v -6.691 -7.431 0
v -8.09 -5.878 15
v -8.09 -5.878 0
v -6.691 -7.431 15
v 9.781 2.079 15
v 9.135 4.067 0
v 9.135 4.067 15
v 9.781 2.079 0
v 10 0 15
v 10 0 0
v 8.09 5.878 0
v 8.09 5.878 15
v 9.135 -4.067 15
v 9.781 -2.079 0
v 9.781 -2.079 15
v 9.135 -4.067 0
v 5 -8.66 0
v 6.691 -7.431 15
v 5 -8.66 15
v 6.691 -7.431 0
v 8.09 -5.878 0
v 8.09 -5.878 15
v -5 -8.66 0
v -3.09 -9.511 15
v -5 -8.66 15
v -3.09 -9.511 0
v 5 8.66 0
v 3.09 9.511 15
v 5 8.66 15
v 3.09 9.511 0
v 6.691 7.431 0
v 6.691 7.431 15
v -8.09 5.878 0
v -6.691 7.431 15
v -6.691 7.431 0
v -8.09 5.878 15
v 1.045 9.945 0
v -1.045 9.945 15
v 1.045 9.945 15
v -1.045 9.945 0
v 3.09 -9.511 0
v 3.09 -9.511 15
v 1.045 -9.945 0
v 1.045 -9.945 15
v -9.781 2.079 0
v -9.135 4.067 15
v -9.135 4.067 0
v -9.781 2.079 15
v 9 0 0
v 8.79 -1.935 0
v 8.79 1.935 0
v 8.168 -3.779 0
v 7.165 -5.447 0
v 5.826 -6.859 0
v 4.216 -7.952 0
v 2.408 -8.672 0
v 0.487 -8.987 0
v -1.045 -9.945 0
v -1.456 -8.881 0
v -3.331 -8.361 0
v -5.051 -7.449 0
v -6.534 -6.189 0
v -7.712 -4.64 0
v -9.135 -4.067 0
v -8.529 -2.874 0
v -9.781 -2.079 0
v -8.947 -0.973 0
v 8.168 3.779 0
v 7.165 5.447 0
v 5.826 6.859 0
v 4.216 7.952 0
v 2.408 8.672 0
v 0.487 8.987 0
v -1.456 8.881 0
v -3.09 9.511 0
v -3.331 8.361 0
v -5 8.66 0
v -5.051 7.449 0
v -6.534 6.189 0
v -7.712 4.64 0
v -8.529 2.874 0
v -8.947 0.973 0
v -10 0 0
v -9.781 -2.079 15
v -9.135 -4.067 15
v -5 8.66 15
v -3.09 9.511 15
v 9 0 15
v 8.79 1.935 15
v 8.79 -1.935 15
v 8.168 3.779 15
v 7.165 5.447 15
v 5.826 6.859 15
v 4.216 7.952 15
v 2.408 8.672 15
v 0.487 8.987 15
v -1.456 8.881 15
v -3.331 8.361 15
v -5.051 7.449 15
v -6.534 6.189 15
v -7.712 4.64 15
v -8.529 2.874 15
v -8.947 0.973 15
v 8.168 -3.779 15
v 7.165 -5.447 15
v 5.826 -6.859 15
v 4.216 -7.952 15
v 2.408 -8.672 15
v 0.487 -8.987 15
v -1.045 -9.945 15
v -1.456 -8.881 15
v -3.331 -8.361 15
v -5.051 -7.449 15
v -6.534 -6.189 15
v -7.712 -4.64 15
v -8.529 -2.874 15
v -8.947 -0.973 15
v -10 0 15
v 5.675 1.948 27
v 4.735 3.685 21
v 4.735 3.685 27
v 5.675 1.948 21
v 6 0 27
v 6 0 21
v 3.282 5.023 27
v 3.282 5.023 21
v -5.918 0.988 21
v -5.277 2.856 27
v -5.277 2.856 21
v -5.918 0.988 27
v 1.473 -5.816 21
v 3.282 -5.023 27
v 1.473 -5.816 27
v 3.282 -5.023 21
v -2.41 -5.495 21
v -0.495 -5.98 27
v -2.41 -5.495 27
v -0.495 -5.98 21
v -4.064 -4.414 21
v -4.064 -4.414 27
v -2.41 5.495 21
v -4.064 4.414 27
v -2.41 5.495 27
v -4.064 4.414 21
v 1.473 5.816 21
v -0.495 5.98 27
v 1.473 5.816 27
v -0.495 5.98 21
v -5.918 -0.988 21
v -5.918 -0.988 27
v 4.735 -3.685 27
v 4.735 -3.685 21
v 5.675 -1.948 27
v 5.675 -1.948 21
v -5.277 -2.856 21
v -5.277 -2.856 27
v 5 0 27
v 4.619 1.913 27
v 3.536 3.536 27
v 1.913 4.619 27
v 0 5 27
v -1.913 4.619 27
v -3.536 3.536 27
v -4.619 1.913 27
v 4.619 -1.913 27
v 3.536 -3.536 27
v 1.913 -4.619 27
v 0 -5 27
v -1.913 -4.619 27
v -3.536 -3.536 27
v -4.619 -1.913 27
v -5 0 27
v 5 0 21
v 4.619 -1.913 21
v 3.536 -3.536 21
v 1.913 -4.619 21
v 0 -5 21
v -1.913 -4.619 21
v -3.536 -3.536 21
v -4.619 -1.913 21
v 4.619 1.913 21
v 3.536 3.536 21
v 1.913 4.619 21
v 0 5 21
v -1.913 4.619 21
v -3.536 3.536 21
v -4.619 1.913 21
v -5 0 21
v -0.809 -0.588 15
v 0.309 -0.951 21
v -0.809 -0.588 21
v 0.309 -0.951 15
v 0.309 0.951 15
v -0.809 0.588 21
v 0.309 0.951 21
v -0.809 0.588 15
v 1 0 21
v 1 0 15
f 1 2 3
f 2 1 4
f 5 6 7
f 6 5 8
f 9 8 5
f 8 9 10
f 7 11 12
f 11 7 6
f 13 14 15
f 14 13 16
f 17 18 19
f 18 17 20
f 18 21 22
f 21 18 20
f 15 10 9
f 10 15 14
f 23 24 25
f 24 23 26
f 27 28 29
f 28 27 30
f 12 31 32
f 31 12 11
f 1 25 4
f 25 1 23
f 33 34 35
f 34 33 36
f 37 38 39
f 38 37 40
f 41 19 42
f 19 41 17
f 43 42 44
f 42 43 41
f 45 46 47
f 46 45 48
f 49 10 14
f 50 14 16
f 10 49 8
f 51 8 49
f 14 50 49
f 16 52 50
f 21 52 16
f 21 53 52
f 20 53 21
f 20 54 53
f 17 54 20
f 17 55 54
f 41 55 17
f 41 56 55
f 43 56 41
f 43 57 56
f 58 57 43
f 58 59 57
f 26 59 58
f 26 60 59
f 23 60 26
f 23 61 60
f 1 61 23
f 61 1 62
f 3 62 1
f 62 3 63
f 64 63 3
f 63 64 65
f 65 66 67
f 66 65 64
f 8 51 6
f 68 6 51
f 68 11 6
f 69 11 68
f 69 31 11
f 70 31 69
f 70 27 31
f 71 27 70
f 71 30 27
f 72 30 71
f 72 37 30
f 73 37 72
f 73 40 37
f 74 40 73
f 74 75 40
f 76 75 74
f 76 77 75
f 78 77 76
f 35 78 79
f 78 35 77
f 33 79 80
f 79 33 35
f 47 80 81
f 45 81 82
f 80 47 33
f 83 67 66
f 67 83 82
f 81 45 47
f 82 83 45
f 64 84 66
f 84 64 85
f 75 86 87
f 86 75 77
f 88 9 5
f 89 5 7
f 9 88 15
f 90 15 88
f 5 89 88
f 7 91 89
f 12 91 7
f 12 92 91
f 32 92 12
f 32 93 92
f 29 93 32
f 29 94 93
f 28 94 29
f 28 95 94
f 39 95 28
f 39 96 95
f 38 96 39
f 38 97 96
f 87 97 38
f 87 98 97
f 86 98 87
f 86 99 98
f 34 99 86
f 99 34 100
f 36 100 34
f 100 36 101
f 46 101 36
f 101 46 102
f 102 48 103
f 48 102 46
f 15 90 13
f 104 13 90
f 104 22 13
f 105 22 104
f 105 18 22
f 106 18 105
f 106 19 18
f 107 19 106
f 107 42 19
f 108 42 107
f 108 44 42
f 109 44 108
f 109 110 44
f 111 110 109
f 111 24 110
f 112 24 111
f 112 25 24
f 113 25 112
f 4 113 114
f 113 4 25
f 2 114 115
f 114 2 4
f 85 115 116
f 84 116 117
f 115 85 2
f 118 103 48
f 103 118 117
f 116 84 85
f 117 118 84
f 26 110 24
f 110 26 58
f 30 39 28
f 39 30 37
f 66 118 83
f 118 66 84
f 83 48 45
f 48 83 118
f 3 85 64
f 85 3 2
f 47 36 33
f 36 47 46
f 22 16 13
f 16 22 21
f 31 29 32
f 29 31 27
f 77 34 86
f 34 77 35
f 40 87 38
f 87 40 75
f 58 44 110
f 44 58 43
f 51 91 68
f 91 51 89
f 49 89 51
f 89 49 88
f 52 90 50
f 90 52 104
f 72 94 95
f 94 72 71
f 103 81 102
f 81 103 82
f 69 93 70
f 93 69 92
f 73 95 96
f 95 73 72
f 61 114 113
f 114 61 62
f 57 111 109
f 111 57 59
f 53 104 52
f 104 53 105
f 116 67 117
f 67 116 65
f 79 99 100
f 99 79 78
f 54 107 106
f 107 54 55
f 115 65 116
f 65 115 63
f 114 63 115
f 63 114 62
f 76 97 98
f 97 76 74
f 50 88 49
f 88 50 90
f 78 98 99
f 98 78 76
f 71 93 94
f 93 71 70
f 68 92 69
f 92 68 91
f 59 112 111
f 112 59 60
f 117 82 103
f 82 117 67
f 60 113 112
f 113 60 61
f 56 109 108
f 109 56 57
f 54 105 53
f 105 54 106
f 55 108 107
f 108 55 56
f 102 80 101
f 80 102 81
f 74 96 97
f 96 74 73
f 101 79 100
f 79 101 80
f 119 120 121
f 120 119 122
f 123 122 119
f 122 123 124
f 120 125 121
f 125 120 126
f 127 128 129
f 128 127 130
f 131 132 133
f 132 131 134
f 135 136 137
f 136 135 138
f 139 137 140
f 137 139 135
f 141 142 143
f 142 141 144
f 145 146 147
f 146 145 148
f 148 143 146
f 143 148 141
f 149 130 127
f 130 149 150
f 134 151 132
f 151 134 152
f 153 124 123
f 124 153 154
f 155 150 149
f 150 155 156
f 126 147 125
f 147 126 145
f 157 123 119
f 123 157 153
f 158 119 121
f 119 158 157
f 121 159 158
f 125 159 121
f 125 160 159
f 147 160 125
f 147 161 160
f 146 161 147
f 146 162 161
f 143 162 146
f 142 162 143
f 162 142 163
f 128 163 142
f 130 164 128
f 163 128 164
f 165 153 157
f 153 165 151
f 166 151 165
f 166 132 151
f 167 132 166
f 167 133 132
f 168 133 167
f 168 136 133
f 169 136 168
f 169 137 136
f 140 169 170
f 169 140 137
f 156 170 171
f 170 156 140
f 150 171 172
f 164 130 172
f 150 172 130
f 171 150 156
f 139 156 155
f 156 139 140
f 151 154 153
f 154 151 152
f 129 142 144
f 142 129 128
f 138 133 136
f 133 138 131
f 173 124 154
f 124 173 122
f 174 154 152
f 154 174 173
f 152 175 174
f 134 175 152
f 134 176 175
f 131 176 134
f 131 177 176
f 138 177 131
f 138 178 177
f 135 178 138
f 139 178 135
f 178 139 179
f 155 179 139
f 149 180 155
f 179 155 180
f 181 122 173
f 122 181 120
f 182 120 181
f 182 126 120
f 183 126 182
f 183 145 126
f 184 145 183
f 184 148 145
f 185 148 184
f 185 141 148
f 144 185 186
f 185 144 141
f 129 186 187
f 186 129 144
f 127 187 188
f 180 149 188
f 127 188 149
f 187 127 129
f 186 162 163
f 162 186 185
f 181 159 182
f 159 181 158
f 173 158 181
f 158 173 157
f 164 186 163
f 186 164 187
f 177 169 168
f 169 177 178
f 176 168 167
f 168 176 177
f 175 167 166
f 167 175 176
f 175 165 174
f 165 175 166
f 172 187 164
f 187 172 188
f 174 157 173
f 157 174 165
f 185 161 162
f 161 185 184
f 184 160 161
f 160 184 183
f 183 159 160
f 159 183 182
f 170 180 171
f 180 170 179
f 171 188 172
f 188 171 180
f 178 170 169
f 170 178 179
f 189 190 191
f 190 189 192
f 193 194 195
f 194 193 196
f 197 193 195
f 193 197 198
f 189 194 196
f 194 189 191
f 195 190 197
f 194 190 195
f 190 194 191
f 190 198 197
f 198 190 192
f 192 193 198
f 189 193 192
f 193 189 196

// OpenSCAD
// ======================================
// 串联双腔直颈型亥姆霍兹共鸣器示意模型
// 3D 打印友好，无倒扣，垂直打印零支撑
// ======================================

// ------------------
// 参数（可修改）
// ------------------
neck_d = 2;       // 颈直径 mm
neck_l = 6;       // 颈长度 mm

upper_r = 6;      // 上小腔半径 mm
upper_h = 6;      // 上小腔高度 mm

lower_r = 10;     // 下大腔半径 mm
lower_h = 15;     // 下大腔高度 mm

wall_thick = 1;   // 壁厚 mm

// ------------------
// 模块
// ------------------
module double_helmholtz(){
    // 整体组合
    union(){
        // 下大腔
        difference(){
            cylinder(h=lower_h, r=lower_r, center=false);
            cylinder(h=lower_h, r=lower_r-wall_thick, center=false);
        }
        
        // 上小腔
        translate([0,0,lower_h+neck_l])
            difference(){
                cylinder(h=upper_h, r=upper_r, center=false);
                cylinder(h=upper_h, r=upper_r-wall_thick, center=false);
            }
        
        // 直颈连接
        translate([0,0,lower_h])
            cylinder(h=neck_l, r=neck_d/2, center=false);
    }
}

// ------------------
// 渲染
// ------------------
double_helmholtz();
